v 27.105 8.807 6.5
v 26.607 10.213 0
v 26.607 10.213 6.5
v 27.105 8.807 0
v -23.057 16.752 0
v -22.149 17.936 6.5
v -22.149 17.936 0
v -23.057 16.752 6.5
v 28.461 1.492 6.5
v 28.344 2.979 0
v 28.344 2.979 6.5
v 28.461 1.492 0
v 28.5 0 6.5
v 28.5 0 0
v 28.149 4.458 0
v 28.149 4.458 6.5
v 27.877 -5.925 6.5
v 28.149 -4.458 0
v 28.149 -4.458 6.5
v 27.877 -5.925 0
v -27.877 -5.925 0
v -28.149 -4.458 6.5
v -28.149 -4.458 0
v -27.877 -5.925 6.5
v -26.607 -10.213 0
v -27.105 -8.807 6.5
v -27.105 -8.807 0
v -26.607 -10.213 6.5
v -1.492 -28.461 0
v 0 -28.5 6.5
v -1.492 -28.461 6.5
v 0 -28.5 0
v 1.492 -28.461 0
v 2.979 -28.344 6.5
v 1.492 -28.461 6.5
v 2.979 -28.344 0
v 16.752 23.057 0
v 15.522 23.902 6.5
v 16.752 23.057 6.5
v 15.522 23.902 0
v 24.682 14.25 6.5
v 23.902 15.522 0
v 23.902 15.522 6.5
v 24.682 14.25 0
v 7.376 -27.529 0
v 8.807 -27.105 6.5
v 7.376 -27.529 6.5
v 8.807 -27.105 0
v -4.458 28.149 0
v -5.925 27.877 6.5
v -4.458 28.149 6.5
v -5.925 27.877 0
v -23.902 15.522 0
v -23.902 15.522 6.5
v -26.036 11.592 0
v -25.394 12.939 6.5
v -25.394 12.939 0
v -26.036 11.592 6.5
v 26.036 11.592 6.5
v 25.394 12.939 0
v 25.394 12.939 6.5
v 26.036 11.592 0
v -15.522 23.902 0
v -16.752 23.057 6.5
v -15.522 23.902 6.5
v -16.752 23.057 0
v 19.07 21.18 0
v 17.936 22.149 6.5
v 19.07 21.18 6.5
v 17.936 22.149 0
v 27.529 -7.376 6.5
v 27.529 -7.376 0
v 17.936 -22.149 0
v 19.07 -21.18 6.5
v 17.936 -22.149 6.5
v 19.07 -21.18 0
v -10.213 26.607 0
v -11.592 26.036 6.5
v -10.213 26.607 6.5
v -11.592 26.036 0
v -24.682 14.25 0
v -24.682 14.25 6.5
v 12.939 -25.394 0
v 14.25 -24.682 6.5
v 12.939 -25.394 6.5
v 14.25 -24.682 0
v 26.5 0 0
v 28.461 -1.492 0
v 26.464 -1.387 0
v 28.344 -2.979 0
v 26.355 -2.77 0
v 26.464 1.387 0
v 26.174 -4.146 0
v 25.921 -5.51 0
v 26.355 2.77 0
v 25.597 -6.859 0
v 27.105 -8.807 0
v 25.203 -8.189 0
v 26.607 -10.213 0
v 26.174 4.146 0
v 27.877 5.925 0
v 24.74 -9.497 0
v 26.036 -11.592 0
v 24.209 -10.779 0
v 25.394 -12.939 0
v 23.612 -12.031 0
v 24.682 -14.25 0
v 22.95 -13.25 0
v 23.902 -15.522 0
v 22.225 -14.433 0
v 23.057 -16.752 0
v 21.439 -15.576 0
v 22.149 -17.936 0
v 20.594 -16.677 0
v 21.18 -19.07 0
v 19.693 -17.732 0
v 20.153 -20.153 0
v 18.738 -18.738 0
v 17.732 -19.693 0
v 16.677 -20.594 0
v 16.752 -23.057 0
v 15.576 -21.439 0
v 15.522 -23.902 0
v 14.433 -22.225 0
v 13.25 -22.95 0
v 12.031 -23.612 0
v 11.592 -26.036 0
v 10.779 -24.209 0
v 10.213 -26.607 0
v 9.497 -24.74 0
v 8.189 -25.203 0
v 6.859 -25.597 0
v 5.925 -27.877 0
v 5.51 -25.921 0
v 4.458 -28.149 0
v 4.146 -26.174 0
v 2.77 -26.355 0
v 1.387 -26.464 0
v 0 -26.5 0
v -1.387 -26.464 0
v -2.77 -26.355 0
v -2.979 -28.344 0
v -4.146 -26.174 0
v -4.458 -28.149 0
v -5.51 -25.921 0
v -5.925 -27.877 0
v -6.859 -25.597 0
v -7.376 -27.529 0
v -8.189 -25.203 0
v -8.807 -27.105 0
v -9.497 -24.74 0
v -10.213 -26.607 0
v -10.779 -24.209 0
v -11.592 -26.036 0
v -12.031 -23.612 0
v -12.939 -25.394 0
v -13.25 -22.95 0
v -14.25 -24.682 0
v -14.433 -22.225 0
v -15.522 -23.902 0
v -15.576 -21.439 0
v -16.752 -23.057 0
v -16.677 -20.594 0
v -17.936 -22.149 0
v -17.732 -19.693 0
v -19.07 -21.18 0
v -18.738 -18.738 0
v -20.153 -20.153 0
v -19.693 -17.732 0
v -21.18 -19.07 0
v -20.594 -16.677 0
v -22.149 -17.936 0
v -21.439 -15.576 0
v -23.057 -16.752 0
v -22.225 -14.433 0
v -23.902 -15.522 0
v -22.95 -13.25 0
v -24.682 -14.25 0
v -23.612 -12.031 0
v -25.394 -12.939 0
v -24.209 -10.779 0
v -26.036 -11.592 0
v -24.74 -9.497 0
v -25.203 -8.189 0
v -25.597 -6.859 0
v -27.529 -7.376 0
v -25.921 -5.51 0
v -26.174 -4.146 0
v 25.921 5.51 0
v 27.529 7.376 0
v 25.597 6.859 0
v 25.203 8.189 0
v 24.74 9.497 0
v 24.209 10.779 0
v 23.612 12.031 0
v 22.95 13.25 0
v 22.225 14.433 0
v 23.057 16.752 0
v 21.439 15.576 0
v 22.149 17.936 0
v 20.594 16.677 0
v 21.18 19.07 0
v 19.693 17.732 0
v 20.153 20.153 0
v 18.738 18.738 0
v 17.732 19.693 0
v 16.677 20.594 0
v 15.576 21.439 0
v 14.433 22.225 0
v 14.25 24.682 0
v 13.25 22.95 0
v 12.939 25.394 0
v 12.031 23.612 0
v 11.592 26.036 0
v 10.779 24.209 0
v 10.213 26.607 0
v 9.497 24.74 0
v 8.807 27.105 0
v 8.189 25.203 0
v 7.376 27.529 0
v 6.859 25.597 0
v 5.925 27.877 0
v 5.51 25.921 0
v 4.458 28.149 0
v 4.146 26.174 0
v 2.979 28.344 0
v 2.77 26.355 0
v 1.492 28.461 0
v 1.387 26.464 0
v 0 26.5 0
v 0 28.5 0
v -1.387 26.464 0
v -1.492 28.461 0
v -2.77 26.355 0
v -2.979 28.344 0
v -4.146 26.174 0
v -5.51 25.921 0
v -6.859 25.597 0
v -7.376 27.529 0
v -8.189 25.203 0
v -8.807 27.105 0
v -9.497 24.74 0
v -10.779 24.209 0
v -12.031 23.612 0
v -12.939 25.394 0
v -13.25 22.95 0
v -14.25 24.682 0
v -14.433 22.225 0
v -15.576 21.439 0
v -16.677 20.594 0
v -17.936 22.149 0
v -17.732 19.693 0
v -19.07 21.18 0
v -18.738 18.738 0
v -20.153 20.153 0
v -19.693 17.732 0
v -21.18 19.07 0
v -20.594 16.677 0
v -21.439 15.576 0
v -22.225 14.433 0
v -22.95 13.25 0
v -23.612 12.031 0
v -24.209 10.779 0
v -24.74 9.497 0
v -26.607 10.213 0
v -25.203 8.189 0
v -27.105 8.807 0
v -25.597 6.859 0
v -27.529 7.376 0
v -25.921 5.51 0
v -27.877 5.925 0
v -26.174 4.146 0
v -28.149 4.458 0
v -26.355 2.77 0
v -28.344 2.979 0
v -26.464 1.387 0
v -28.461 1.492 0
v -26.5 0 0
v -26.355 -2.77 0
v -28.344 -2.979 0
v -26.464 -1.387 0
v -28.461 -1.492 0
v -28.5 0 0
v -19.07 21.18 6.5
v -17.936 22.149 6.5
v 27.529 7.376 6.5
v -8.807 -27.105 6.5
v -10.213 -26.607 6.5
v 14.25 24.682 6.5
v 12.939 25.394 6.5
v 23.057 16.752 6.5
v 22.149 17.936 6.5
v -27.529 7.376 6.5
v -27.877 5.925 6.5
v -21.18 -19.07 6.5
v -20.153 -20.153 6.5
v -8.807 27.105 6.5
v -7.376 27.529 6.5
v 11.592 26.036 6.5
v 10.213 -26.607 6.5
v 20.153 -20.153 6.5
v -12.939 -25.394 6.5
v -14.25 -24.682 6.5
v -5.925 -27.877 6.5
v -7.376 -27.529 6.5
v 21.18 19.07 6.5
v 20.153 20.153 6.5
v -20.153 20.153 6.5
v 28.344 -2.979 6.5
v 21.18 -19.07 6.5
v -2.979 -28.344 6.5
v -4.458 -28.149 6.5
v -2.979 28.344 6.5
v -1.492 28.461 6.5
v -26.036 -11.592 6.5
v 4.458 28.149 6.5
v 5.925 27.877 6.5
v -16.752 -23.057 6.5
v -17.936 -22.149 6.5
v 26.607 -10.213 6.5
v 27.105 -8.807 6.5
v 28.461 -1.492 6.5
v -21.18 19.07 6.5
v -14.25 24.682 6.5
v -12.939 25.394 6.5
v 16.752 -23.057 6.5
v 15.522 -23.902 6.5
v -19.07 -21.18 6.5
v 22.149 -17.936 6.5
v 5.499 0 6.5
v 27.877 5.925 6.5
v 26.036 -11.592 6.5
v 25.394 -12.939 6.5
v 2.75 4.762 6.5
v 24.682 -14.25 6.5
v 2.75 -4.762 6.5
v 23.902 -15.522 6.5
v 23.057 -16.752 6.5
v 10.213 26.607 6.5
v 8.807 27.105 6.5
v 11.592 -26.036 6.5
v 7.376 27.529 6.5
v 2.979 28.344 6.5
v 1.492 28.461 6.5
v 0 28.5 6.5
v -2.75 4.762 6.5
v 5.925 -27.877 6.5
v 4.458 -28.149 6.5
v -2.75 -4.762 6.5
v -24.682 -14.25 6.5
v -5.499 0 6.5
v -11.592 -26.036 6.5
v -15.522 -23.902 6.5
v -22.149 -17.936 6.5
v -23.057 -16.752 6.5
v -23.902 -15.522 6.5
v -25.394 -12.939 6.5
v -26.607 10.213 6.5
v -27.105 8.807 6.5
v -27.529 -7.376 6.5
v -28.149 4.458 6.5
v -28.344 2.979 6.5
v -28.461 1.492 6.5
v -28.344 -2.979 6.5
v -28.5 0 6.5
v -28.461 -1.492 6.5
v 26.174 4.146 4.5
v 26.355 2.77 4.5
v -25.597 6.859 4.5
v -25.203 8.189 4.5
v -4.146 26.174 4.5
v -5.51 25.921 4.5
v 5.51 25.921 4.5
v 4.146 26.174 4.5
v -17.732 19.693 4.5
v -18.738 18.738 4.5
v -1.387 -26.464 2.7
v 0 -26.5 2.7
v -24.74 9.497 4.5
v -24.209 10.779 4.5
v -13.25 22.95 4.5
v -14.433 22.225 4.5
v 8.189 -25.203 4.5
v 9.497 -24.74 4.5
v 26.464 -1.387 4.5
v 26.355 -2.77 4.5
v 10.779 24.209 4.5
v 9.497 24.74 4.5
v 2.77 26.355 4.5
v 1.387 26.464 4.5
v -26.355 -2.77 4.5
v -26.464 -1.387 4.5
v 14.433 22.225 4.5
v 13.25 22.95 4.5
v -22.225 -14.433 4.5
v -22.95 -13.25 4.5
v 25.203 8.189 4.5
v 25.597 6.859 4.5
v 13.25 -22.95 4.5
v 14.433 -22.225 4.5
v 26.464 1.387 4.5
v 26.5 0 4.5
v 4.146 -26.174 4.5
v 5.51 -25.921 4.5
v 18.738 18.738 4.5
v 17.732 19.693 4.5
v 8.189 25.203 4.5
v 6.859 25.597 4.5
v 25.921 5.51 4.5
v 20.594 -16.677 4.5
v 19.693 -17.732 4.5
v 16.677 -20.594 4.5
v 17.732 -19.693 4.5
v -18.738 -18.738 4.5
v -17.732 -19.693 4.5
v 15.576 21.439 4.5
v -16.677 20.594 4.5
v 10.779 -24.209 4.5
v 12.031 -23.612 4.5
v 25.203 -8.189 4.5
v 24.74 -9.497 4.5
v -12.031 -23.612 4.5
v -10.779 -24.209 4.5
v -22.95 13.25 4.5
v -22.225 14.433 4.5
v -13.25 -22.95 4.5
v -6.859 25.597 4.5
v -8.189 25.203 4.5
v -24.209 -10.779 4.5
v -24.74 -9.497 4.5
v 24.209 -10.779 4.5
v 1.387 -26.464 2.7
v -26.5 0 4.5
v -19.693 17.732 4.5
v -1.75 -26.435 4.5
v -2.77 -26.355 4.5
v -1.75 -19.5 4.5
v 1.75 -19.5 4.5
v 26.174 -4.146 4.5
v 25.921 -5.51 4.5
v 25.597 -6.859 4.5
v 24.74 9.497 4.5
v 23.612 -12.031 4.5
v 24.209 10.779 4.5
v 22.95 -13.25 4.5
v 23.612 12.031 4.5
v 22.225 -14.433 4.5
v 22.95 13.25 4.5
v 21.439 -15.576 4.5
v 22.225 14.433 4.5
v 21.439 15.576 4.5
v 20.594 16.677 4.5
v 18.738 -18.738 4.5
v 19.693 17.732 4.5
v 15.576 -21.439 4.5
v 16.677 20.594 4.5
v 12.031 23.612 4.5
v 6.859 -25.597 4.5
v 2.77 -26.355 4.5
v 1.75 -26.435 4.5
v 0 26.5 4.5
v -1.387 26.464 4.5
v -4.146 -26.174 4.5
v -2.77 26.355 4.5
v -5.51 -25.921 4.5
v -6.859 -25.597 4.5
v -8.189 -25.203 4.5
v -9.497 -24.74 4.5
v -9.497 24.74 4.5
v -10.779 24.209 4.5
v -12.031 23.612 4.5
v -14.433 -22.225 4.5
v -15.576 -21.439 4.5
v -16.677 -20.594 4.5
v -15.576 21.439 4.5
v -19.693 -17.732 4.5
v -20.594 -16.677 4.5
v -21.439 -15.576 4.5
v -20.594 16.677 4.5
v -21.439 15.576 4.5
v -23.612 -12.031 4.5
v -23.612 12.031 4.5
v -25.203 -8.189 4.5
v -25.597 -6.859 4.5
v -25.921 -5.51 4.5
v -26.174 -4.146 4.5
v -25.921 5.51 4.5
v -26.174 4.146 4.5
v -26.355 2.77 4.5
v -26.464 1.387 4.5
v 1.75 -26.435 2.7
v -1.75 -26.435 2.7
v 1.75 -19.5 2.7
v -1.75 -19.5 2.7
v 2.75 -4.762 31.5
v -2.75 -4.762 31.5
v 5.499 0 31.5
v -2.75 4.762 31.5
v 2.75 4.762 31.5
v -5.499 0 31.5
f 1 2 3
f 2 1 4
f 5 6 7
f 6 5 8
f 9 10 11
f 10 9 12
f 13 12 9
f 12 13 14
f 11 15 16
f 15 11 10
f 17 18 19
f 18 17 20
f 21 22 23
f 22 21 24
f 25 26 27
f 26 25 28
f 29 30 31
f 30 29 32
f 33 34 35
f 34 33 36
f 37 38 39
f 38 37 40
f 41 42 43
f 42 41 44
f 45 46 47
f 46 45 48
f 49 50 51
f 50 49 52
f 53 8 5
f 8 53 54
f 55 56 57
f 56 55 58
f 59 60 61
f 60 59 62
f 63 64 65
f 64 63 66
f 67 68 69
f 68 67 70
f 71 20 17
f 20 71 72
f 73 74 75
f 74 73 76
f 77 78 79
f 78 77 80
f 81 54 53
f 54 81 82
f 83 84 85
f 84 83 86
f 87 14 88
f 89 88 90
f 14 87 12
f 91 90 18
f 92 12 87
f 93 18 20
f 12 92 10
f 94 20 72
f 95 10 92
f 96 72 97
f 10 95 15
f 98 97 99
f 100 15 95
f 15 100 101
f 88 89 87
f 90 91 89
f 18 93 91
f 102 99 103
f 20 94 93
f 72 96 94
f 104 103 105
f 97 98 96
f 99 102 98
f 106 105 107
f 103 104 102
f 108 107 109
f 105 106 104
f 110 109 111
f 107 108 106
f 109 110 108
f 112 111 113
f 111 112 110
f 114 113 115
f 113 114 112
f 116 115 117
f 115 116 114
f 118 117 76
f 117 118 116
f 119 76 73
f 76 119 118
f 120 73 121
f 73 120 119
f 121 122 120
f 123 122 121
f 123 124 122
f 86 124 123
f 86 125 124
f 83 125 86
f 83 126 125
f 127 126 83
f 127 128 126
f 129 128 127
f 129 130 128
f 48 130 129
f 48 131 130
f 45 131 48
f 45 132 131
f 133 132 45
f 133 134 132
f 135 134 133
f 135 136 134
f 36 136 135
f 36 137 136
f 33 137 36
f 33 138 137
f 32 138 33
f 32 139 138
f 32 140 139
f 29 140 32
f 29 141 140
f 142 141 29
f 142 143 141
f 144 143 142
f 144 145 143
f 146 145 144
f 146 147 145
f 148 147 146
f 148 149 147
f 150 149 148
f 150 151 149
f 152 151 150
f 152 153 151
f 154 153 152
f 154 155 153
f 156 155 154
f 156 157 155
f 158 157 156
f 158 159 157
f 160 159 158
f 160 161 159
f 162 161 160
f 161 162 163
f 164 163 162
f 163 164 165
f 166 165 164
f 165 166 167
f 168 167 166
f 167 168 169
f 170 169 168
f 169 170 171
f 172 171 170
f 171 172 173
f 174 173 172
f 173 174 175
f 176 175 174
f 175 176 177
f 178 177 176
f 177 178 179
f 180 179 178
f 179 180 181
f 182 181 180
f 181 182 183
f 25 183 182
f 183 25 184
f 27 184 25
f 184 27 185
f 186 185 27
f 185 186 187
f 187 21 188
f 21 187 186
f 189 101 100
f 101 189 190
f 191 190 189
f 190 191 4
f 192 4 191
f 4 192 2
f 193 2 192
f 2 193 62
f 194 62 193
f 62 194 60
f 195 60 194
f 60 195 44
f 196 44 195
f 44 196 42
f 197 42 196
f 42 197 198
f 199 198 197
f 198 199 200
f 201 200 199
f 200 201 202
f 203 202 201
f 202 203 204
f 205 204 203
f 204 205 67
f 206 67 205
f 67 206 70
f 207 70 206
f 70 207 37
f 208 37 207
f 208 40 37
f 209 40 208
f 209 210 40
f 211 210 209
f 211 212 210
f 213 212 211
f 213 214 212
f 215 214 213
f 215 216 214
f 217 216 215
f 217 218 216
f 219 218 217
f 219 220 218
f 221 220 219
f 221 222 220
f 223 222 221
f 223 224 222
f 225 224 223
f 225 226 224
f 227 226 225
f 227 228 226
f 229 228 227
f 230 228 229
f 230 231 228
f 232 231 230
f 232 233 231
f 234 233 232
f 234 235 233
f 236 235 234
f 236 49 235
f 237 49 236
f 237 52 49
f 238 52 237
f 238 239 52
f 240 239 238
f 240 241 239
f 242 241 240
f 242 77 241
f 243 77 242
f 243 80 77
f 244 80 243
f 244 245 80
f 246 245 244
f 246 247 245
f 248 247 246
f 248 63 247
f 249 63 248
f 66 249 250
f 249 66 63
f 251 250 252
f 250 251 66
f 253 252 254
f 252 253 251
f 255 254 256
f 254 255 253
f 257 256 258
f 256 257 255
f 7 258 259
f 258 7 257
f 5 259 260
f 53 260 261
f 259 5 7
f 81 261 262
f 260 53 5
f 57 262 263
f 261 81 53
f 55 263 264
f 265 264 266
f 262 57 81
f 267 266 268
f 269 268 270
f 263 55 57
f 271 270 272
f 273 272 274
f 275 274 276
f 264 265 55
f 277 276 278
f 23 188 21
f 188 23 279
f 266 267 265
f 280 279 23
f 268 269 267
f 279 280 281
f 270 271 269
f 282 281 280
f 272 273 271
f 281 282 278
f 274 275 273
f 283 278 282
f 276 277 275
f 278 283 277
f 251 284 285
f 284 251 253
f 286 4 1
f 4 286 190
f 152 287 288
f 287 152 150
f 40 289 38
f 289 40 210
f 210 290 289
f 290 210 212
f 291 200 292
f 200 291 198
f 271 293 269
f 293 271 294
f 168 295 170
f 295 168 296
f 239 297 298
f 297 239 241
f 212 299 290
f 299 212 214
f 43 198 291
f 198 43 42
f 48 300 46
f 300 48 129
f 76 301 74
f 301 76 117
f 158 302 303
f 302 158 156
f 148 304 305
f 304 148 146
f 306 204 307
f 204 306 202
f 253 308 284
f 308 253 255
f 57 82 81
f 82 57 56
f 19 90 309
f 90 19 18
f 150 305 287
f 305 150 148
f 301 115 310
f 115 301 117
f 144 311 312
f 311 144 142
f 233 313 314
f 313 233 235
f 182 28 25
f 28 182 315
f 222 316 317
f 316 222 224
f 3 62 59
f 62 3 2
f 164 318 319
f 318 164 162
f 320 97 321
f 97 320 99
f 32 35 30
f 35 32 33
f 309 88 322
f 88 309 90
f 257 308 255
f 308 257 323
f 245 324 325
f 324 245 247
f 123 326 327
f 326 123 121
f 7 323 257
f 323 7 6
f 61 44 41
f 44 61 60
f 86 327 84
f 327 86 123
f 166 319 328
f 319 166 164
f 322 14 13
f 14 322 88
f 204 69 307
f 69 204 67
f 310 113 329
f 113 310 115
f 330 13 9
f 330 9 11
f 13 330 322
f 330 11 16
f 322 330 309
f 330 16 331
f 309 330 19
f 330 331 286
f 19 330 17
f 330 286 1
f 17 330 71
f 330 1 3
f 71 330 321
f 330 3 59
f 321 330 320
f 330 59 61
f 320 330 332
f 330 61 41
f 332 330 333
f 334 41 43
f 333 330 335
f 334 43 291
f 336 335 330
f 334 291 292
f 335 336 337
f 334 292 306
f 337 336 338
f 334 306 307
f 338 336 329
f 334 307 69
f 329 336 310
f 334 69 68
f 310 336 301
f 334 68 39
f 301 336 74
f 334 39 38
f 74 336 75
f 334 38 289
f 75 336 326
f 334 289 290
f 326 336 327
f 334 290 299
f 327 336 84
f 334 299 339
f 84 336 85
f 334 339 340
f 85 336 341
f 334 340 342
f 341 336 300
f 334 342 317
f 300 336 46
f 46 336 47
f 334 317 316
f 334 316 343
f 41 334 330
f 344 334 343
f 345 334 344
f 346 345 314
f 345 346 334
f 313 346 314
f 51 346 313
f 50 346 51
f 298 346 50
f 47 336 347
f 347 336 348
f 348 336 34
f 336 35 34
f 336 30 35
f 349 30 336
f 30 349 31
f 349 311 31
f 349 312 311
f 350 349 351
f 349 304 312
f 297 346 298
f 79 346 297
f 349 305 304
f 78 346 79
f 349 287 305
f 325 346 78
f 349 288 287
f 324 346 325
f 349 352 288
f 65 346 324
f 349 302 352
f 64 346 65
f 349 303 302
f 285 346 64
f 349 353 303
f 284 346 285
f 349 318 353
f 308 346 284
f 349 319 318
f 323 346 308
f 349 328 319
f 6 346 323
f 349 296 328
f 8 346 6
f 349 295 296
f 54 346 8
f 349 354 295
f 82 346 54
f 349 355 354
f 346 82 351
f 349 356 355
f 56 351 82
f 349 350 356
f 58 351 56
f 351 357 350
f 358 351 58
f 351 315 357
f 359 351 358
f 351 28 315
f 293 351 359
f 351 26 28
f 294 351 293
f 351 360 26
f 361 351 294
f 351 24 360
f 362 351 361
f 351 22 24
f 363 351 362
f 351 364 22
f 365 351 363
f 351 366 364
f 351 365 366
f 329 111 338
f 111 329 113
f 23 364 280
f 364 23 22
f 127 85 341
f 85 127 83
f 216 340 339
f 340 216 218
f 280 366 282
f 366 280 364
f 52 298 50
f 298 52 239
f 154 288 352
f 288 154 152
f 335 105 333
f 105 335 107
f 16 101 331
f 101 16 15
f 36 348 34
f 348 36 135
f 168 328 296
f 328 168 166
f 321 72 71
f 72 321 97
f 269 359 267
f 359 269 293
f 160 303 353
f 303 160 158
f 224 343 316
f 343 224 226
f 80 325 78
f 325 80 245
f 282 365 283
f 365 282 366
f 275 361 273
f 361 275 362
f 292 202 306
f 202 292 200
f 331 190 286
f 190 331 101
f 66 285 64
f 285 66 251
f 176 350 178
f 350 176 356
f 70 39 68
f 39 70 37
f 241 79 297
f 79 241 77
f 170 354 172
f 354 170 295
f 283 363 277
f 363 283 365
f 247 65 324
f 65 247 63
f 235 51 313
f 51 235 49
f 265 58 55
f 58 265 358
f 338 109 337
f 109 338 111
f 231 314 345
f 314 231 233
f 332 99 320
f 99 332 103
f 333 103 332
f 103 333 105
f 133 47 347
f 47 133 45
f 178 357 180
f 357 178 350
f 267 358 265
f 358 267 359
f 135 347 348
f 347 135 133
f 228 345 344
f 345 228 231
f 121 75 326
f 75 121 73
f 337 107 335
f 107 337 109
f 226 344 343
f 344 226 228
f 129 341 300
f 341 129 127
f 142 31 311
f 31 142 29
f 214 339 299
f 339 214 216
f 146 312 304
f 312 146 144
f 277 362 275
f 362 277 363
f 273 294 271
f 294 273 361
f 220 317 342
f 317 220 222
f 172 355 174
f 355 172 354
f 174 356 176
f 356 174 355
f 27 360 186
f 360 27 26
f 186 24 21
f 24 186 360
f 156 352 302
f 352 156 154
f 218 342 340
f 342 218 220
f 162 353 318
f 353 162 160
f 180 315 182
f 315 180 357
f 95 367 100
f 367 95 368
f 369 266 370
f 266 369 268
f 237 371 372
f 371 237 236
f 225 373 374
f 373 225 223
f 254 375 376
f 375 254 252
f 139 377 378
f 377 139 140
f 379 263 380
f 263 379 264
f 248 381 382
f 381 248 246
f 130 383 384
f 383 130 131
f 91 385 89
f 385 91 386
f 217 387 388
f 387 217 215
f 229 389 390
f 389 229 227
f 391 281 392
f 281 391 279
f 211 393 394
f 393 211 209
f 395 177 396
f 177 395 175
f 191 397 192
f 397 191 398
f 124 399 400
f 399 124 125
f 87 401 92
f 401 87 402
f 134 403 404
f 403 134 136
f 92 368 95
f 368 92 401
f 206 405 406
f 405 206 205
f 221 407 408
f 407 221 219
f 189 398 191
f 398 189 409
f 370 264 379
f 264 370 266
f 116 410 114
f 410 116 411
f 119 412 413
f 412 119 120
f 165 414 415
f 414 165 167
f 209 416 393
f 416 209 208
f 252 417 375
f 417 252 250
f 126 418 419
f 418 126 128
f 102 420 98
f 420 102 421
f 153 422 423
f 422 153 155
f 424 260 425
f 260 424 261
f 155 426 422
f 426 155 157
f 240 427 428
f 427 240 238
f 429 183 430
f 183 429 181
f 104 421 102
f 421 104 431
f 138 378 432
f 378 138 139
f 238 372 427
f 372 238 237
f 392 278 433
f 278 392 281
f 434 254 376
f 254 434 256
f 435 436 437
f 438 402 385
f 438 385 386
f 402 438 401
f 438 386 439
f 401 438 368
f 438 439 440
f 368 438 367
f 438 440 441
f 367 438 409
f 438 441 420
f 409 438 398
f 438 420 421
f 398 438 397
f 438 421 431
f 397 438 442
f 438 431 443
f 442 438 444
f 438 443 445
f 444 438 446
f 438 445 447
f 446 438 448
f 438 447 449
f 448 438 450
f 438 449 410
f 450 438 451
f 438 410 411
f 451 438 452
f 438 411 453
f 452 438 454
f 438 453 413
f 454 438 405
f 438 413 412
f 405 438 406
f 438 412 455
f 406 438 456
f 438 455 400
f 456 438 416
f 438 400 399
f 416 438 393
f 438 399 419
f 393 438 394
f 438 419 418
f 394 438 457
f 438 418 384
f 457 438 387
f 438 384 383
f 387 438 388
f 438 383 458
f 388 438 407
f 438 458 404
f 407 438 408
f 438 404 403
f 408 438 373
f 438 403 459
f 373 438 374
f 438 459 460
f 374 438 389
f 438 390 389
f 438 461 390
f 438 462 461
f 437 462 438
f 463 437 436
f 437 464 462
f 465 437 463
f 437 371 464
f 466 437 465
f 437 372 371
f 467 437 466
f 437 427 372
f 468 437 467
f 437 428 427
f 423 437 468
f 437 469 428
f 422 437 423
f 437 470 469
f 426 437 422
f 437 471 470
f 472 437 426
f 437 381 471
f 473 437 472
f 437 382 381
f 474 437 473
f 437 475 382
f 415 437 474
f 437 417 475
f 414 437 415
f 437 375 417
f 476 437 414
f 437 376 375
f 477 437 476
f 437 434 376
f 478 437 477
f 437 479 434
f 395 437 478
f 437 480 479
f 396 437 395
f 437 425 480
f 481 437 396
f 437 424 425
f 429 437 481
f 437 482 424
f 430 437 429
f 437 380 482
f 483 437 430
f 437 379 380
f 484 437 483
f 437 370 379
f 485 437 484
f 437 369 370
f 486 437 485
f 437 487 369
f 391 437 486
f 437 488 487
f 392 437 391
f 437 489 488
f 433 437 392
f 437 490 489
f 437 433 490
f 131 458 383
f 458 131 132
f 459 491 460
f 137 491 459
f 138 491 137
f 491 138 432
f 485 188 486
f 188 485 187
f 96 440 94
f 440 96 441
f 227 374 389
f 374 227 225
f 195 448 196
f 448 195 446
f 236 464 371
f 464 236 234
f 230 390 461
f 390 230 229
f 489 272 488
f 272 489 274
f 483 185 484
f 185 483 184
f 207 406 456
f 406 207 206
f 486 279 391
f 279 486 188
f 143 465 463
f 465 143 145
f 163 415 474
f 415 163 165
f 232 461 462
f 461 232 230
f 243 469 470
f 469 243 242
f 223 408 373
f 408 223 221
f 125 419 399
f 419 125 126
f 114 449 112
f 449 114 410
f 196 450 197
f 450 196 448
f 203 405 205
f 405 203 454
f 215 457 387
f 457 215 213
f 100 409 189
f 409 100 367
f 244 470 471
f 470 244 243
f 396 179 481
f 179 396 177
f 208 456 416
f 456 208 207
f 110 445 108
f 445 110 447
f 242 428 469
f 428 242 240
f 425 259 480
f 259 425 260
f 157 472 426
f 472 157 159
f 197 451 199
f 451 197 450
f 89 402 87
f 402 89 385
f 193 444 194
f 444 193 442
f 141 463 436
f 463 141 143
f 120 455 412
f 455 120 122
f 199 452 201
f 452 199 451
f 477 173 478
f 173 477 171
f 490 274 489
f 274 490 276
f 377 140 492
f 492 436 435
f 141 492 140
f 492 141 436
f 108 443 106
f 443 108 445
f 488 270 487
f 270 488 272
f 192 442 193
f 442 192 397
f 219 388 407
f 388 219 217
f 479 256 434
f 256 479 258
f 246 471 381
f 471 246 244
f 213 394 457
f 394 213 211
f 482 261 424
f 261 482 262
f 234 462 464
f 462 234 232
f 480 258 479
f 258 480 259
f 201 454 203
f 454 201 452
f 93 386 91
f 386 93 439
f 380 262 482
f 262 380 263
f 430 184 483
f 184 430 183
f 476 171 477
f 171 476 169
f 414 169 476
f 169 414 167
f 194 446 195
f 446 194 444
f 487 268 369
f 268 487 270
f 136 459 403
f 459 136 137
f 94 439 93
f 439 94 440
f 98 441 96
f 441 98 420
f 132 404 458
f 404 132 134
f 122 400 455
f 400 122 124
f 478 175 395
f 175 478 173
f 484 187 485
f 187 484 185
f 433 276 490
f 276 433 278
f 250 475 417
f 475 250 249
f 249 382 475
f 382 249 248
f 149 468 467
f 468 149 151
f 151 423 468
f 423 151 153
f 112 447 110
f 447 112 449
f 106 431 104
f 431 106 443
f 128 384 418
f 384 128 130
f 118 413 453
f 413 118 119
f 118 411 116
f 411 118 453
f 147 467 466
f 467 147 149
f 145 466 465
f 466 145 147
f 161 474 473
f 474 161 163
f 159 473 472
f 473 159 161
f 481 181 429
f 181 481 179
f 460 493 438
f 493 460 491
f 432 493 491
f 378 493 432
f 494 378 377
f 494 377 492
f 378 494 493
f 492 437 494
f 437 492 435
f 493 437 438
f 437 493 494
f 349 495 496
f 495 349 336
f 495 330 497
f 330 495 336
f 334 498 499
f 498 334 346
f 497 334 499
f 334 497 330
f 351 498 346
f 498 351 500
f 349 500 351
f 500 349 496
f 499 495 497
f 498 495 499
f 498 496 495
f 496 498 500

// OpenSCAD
// A square with a recess that holds an estrogen clicky.
//
// https://twitter.com/nyanotech/status/1188263391351070720

max_chuck_size = (3/8) * 25.4;
chuck_depth = 25;

// I think dia could be 51, but expanded a bit for tolerances
spinny_dia = 53;
spinny_thickness = 4.5;
rim_thickness = 2;

notch_width = 3.5;
notch_depth = 1.8;
notch_length = 7;

difference() {
  cylinder($fn=120, d=(spinny_dia + 2*rim_thickness), h=rim_thickness + spinny_thickness);
  cylinder($fn=120, d=spinny_dia, h=spinny_thickness);
}

translate([-notch_width/2, -spinny_dia/2, spinny_thickness - notch_depth]) {
  cube([notch_width, notch_length, notch_depth]);
}

translate([0, 0, rim_thickness + spinny_thickness]) {
  cylinder($fn=6, d=(max_chuck_size / (sqrt(3)/2)), h=chuck_depth);
}
